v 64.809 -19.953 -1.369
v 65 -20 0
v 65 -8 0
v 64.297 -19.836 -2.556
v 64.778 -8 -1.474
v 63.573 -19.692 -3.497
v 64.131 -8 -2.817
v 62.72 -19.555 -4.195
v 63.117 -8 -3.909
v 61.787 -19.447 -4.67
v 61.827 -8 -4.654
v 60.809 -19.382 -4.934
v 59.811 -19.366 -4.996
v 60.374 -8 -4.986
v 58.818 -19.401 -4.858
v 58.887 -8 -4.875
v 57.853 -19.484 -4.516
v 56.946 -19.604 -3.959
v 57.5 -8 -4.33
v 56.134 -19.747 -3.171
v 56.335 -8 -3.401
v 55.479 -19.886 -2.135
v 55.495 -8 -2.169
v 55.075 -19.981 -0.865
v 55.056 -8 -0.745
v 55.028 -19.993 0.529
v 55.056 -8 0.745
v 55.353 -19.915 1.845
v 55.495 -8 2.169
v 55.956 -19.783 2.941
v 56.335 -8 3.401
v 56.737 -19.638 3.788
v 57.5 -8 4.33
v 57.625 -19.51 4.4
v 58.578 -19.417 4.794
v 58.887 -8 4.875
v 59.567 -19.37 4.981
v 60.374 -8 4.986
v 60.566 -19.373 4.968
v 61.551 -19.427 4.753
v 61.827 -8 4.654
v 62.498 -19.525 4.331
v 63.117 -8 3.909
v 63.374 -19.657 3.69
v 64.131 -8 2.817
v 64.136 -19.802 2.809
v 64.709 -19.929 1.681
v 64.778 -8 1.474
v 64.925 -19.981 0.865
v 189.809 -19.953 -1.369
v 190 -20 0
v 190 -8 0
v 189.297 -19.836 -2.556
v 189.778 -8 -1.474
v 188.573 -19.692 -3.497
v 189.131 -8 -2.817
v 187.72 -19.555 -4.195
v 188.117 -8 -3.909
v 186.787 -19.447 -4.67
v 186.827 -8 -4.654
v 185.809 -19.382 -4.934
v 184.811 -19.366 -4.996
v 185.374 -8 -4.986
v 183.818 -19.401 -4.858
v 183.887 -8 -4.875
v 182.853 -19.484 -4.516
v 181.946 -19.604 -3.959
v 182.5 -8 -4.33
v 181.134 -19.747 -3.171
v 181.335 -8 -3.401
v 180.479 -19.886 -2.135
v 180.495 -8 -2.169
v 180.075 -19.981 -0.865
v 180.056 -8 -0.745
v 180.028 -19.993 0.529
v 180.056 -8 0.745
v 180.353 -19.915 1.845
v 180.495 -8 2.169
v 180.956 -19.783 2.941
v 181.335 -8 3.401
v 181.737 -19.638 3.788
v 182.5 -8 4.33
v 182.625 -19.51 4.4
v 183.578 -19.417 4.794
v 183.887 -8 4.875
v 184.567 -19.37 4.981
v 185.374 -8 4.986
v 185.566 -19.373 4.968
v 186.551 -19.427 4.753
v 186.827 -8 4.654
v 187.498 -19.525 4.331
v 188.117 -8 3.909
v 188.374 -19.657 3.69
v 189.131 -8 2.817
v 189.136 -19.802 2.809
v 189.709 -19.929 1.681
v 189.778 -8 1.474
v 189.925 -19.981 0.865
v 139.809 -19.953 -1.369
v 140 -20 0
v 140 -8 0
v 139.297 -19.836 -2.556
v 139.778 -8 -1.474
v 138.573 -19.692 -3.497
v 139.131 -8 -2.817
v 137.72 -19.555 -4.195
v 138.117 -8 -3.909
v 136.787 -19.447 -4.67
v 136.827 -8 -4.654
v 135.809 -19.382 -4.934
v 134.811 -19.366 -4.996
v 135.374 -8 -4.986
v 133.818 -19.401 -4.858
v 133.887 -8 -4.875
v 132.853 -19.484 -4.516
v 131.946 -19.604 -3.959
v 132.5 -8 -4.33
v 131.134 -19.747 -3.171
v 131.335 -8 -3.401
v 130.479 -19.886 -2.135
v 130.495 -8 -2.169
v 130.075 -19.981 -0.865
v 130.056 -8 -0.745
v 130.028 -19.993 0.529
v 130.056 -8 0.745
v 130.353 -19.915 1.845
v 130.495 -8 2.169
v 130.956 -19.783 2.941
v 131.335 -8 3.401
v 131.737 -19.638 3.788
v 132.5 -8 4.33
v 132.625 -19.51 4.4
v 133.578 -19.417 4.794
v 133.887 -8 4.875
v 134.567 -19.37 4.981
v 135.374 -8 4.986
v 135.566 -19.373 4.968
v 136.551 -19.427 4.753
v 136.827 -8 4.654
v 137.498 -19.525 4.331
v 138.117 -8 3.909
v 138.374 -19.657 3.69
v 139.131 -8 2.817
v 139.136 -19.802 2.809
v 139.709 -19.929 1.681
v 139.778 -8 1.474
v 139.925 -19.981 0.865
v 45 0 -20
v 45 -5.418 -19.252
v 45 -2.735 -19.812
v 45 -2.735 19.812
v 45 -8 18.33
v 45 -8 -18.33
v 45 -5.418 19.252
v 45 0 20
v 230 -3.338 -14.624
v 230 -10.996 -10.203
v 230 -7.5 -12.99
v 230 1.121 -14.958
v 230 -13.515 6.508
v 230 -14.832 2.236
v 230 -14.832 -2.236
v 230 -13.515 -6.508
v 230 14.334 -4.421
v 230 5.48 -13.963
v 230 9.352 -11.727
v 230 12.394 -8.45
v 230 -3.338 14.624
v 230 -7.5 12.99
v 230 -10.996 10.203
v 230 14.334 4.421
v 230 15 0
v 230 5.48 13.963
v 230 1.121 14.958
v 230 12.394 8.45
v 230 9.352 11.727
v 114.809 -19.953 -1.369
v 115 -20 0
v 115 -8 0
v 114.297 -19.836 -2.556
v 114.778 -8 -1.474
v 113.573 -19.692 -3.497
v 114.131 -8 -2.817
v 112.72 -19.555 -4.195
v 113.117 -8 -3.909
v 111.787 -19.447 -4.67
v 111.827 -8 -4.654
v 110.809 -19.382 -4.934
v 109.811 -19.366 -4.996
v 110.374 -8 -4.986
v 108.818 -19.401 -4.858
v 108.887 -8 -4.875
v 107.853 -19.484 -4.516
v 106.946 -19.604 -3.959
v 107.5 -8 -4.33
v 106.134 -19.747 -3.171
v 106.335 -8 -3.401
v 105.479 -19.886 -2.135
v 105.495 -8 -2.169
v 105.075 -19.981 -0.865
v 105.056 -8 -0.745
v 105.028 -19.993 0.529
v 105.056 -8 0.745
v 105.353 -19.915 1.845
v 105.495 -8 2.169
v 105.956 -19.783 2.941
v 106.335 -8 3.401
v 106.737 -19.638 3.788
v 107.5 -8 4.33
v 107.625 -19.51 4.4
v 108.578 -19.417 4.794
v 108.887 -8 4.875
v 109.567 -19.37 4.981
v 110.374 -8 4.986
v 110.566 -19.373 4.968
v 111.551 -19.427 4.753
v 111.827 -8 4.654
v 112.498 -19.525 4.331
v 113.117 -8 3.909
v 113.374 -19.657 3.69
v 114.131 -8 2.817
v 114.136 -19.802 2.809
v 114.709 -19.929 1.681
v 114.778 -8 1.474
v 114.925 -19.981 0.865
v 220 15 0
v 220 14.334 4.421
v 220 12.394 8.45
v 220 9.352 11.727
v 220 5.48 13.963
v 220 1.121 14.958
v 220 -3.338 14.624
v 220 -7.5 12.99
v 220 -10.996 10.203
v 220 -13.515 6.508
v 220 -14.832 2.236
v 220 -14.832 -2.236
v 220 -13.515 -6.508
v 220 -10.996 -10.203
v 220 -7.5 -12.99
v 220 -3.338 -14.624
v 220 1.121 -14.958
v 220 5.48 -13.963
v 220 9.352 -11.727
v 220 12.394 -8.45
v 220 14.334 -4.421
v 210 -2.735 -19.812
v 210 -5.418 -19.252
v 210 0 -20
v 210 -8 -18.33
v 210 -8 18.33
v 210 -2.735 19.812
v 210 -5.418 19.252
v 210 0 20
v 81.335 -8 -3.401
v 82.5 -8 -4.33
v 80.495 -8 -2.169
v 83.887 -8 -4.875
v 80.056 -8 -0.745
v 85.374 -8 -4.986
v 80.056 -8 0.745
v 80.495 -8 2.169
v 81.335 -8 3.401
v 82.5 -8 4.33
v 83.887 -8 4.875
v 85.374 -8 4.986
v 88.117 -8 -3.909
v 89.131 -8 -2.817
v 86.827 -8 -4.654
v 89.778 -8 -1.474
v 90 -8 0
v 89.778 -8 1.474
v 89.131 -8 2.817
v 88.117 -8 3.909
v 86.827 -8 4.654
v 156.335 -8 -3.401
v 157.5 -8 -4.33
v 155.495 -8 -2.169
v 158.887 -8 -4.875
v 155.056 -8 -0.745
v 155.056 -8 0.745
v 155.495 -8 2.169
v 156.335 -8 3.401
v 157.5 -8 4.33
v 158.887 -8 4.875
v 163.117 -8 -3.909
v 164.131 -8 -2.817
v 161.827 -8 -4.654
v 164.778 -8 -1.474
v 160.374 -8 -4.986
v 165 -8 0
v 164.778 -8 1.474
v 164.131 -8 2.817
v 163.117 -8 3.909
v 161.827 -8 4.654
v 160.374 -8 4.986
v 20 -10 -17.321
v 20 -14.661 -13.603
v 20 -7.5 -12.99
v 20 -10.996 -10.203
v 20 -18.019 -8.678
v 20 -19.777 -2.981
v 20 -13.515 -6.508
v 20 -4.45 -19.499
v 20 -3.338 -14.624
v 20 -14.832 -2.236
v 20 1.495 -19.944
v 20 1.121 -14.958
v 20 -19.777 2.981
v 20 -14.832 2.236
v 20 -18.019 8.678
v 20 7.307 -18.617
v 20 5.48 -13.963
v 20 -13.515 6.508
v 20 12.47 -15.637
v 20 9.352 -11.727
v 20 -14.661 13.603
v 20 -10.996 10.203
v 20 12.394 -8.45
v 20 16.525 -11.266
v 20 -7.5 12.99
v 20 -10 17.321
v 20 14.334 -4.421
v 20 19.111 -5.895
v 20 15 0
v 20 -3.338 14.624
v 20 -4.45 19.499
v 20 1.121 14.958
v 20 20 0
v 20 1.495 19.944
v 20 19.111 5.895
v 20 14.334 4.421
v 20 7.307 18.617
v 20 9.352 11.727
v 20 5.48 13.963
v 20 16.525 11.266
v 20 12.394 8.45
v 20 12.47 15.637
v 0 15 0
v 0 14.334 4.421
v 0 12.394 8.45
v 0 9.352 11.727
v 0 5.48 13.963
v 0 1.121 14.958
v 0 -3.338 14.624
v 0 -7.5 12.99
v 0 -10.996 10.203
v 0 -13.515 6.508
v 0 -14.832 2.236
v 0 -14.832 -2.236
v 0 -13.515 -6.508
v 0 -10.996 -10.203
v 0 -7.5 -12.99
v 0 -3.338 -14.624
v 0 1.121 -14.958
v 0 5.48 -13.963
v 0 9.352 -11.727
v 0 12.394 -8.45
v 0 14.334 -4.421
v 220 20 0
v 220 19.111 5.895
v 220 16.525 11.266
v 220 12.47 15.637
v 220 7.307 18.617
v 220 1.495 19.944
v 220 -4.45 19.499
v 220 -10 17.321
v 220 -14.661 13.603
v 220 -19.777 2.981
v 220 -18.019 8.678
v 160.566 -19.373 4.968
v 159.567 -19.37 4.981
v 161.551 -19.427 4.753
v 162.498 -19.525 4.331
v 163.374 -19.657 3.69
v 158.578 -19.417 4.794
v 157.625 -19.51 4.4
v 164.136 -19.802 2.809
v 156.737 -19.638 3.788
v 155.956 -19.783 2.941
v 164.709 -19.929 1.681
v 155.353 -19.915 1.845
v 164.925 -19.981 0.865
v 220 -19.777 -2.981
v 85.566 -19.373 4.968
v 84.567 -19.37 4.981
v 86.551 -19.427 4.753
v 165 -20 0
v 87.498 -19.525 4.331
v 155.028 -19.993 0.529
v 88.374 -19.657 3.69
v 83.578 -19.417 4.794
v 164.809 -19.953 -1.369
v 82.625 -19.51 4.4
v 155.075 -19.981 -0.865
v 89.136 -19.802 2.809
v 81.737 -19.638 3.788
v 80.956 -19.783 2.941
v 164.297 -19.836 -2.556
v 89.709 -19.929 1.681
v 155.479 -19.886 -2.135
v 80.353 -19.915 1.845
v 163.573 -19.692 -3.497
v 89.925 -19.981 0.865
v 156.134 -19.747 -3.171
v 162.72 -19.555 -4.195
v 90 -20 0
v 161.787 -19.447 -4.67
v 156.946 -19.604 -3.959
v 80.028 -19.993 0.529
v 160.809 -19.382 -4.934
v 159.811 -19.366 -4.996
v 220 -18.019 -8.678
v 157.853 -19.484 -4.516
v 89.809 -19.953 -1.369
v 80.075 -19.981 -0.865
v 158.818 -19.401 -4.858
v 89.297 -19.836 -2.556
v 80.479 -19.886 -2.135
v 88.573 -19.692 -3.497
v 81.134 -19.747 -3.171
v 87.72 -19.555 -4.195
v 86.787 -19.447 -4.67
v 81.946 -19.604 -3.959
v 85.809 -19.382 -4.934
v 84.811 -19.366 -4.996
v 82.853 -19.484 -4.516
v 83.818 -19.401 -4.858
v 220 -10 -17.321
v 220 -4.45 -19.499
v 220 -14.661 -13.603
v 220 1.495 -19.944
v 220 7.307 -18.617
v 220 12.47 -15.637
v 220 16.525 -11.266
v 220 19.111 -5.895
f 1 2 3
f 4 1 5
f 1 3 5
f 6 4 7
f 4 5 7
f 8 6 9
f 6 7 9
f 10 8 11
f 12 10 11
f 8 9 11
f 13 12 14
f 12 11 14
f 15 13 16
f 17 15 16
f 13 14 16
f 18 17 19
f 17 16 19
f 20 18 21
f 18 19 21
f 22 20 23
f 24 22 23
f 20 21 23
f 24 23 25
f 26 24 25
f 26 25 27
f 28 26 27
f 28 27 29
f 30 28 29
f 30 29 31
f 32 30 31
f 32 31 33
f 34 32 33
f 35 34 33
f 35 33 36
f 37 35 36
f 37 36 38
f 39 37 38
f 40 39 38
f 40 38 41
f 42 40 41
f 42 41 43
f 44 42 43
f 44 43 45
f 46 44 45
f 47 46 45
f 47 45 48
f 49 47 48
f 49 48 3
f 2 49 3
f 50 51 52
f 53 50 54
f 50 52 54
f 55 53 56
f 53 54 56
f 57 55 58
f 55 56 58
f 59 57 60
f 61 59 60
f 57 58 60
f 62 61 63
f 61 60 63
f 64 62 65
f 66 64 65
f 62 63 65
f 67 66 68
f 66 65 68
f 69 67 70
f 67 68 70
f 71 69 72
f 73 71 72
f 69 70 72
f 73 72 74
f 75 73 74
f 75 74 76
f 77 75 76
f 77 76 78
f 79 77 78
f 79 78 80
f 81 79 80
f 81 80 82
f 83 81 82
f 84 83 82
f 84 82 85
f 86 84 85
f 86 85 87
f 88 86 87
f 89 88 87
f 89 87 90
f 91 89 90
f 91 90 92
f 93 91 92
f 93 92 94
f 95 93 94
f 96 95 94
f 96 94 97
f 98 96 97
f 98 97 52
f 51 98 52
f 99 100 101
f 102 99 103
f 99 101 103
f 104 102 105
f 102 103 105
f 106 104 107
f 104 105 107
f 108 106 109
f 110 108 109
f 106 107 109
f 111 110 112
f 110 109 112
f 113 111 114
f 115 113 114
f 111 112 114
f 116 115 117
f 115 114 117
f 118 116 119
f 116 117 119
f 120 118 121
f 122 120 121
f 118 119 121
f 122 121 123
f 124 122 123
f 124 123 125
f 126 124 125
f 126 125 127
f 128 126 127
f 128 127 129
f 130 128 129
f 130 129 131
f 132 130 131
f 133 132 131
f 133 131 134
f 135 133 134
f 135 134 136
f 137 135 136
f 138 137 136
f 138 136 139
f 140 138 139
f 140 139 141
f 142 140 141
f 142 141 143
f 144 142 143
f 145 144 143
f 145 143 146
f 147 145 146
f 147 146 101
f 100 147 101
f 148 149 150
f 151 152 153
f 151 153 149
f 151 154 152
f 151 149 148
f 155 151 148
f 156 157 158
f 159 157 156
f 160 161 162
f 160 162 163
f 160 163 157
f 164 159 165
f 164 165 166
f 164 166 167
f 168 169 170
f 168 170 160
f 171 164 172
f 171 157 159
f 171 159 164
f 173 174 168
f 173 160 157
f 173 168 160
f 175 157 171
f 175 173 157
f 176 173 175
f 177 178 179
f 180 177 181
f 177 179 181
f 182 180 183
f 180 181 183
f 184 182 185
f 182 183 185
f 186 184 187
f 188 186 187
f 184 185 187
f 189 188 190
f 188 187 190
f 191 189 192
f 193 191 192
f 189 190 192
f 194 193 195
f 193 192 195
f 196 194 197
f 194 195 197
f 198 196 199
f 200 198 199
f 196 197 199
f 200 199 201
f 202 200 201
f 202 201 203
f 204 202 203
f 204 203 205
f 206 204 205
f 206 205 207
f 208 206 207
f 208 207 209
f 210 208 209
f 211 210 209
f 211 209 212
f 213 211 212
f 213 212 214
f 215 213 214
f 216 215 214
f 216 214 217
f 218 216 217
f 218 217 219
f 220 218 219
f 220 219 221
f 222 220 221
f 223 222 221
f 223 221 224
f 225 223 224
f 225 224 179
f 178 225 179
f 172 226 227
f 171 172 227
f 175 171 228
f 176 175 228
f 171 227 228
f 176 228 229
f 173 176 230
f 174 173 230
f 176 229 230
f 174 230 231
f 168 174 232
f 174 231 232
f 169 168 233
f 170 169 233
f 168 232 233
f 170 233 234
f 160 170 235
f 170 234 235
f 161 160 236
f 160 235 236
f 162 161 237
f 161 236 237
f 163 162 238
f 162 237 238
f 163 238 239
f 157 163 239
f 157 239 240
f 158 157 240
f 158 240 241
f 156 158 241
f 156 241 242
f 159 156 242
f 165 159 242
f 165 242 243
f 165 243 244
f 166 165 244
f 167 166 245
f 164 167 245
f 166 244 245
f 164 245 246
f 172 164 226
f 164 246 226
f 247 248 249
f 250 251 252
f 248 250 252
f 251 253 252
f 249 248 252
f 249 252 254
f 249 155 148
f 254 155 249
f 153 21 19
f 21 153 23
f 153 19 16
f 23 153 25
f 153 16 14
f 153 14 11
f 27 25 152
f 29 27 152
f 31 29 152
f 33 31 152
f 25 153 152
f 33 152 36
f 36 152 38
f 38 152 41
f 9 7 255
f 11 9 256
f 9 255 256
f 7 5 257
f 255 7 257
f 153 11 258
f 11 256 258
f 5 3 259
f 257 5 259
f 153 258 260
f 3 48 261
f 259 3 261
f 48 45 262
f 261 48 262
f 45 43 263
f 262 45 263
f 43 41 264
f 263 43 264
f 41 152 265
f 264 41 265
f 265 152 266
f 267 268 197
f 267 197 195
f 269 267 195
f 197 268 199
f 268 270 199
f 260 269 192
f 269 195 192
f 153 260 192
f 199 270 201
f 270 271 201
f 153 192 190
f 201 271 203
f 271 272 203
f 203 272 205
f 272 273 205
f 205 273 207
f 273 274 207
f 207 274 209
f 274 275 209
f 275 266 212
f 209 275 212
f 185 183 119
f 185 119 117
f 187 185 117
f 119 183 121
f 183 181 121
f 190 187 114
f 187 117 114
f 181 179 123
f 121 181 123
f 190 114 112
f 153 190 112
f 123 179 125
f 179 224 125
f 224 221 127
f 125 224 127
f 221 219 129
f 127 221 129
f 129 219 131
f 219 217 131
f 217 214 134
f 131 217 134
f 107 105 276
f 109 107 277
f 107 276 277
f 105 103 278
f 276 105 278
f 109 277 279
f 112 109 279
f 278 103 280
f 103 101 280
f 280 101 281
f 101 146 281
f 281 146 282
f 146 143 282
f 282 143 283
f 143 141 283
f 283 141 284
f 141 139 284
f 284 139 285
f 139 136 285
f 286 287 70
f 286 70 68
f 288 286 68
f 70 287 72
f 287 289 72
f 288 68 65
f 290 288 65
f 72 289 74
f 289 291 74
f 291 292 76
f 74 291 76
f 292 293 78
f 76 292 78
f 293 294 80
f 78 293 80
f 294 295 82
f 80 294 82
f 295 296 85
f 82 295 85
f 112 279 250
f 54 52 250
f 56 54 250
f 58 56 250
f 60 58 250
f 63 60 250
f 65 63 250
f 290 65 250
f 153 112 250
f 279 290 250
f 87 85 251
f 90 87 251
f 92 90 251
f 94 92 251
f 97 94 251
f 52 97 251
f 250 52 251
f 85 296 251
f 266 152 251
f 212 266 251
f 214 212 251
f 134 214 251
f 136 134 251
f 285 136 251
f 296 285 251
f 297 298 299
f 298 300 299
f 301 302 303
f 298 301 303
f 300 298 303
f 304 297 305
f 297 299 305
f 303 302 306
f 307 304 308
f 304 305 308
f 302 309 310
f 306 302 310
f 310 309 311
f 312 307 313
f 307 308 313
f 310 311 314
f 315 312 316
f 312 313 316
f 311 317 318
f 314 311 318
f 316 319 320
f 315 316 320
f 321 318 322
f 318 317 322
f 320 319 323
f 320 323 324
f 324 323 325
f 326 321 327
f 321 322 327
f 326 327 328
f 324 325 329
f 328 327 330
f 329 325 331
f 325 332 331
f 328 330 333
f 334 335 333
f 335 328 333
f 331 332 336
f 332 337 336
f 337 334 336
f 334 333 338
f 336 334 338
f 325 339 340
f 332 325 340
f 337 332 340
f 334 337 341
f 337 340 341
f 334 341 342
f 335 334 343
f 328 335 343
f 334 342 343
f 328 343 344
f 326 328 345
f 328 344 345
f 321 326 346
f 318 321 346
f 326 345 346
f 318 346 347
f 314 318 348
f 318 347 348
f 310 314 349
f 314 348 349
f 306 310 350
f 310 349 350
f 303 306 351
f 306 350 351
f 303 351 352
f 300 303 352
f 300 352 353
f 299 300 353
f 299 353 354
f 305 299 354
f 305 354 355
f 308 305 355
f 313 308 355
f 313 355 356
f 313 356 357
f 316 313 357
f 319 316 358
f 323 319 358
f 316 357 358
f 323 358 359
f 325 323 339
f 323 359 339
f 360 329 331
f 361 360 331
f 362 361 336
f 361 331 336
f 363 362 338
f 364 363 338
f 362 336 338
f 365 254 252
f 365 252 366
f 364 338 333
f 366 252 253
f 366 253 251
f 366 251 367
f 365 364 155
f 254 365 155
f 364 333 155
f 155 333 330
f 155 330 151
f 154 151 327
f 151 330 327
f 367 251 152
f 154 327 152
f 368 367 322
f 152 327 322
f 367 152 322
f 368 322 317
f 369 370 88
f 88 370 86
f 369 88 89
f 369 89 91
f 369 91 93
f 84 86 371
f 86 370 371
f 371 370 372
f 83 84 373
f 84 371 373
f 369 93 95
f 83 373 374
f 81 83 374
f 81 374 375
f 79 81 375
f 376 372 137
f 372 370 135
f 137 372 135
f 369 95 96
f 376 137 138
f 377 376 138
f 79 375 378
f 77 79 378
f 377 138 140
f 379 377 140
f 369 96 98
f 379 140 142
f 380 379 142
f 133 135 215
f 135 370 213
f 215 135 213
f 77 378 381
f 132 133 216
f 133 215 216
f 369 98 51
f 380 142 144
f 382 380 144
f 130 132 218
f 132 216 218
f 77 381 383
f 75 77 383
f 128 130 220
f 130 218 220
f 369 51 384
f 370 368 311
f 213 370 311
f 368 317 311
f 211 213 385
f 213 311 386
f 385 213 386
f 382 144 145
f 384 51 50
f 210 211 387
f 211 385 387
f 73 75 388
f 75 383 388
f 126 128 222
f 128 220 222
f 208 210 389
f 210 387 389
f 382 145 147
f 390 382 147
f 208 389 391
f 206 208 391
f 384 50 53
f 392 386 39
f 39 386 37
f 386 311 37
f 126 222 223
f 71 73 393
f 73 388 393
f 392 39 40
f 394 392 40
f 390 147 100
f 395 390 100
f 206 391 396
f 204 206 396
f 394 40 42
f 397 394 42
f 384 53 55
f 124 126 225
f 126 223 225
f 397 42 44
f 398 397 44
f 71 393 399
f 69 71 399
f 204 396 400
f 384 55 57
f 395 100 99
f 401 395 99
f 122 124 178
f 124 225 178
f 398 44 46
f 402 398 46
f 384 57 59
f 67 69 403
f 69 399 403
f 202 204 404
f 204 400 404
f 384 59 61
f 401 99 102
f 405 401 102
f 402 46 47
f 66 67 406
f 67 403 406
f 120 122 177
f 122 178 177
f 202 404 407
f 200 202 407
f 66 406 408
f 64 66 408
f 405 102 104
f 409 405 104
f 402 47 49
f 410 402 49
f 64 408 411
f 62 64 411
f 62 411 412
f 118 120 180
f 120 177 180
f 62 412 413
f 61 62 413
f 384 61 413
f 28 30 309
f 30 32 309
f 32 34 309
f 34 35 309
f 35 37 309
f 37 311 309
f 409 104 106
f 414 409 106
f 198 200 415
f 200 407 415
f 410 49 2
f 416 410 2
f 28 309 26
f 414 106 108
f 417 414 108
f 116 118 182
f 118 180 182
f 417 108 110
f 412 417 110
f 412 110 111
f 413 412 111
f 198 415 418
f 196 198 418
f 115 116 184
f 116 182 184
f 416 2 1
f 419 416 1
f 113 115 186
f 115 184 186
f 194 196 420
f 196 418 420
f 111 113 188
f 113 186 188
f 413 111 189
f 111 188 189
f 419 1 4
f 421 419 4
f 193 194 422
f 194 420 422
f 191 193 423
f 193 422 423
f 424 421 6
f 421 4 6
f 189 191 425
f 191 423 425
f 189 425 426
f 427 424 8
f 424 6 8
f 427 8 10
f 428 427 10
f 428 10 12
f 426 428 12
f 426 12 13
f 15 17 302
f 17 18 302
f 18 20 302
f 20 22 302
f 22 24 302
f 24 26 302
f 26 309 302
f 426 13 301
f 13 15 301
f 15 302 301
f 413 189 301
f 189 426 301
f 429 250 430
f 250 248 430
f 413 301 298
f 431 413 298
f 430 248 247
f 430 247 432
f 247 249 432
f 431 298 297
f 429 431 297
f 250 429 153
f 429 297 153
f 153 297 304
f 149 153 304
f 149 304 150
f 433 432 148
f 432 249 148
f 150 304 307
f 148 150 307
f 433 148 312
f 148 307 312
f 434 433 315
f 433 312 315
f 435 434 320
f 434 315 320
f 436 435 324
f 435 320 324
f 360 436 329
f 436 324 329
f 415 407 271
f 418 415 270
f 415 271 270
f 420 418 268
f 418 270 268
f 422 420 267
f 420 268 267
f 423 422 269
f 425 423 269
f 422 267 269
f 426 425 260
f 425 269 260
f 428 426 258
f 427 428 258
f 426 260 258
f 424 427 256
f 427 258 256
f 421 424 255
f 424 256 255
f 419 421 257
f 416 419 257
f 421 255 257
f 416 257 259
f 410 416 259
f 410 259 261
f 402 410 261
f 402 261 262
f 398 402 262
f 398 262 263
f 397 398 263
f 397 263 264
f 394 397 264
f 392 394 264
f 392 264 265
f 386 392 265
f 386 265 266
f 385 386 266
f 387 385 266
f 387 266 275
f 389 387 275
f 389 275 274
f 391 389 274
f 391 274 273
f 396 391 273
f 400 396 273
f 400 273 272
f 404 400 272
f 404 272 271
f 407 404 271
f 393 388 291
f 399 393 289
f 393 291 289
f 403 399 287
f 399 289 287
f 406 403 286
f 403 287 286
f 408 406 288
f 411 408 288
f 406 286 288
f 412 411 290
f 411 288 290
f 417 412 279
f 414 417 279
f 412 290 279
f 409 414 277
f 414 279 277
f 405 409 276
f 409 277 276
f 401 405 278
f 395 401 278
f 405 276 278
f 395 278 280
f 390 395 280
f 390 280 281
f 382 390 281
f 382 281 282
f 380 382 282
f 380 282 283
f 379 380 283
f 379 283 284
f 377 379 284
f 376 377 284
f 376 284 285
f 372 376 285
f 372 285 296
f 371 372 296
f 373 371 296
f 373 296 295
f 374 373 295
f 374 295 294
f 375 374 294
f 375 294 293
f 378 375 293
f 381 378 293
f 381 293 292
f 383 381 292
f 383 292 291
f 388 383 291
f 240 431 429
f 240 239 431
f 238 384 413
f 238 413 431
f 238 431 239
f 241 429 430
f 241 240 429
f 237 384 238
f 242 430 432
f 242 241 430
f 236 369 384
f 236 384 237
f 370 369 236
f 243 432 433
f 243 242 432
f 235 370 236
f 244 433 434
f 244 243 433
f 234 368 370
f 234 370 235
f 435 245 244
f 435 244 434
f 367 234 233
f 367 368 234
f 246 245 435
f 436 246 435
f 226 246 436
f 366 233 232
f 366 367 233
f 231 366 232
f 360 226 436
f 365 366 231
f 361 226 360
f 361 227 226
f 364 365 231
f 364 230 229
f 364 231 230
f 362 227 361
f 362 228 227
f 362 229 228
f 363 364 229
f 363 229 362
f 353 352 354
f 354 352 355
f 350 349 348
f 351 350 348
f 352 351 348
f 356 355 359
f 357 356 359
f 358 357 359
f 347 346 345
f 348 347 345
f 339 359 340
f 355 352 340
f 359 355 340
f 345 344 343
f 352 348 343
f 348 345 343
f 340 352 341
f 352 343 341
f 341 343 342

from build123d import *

# Parameters (mm, degrees)
F0_R     = 15
F1_DEPTH = 20
F2_R     = 20
F3_DEPTH = 200
F4_W     = 165
F4_H     = 8
F5_DEPTH = 25
F7_D     = 10
F7_DEPTH = 20.001
F8_R     = 15
F9_DEPTH = 10


with BuildPart() as f1:
    # F0 (on Right) → F1 (new body)
    with BuildSketch(Plane.YZ):
        Circle(F0_R)
    extrude(amount=F1_DEPTH)

    # F2 (on face) → F3 (join)
    with BuildSketch(Plane.YZ.offset(20)):
        Circle(F2_R)
    extrude(amount=F3_DEPTH)

    # F4 (on Top) → F5 (cut, symmetric)
    with BuildSketch(Plane.XY):
        with Locations((127.5, -4)):
            Rectangle(F4_W, F4_H)
    extrude(amount=F5_DEPTH, both=True, mode=Mode.SUBTRACT)

    # F7 (through all, one way)
    with BuildSketch(Plane(origin=(0, 0, 0), x_dir=(1, 0, 0), z_dir=(0, 1, 0))):
        with Locations((60, 0), (85, 0), (110, 0), (135, 0), (160, 0), (185, 0)):
            Circle(F7_D / 2)
    extrude(amount=-F7_DEPTH, mode=Mode.SUBTRACT)

    # F8 (on face) → F9 (join)
    with BuildSketch(Plane.YZ.offset(220)):
        Circle(F8_R)
    extrude(amount=F9_DEPTH)


solid = f1.part
